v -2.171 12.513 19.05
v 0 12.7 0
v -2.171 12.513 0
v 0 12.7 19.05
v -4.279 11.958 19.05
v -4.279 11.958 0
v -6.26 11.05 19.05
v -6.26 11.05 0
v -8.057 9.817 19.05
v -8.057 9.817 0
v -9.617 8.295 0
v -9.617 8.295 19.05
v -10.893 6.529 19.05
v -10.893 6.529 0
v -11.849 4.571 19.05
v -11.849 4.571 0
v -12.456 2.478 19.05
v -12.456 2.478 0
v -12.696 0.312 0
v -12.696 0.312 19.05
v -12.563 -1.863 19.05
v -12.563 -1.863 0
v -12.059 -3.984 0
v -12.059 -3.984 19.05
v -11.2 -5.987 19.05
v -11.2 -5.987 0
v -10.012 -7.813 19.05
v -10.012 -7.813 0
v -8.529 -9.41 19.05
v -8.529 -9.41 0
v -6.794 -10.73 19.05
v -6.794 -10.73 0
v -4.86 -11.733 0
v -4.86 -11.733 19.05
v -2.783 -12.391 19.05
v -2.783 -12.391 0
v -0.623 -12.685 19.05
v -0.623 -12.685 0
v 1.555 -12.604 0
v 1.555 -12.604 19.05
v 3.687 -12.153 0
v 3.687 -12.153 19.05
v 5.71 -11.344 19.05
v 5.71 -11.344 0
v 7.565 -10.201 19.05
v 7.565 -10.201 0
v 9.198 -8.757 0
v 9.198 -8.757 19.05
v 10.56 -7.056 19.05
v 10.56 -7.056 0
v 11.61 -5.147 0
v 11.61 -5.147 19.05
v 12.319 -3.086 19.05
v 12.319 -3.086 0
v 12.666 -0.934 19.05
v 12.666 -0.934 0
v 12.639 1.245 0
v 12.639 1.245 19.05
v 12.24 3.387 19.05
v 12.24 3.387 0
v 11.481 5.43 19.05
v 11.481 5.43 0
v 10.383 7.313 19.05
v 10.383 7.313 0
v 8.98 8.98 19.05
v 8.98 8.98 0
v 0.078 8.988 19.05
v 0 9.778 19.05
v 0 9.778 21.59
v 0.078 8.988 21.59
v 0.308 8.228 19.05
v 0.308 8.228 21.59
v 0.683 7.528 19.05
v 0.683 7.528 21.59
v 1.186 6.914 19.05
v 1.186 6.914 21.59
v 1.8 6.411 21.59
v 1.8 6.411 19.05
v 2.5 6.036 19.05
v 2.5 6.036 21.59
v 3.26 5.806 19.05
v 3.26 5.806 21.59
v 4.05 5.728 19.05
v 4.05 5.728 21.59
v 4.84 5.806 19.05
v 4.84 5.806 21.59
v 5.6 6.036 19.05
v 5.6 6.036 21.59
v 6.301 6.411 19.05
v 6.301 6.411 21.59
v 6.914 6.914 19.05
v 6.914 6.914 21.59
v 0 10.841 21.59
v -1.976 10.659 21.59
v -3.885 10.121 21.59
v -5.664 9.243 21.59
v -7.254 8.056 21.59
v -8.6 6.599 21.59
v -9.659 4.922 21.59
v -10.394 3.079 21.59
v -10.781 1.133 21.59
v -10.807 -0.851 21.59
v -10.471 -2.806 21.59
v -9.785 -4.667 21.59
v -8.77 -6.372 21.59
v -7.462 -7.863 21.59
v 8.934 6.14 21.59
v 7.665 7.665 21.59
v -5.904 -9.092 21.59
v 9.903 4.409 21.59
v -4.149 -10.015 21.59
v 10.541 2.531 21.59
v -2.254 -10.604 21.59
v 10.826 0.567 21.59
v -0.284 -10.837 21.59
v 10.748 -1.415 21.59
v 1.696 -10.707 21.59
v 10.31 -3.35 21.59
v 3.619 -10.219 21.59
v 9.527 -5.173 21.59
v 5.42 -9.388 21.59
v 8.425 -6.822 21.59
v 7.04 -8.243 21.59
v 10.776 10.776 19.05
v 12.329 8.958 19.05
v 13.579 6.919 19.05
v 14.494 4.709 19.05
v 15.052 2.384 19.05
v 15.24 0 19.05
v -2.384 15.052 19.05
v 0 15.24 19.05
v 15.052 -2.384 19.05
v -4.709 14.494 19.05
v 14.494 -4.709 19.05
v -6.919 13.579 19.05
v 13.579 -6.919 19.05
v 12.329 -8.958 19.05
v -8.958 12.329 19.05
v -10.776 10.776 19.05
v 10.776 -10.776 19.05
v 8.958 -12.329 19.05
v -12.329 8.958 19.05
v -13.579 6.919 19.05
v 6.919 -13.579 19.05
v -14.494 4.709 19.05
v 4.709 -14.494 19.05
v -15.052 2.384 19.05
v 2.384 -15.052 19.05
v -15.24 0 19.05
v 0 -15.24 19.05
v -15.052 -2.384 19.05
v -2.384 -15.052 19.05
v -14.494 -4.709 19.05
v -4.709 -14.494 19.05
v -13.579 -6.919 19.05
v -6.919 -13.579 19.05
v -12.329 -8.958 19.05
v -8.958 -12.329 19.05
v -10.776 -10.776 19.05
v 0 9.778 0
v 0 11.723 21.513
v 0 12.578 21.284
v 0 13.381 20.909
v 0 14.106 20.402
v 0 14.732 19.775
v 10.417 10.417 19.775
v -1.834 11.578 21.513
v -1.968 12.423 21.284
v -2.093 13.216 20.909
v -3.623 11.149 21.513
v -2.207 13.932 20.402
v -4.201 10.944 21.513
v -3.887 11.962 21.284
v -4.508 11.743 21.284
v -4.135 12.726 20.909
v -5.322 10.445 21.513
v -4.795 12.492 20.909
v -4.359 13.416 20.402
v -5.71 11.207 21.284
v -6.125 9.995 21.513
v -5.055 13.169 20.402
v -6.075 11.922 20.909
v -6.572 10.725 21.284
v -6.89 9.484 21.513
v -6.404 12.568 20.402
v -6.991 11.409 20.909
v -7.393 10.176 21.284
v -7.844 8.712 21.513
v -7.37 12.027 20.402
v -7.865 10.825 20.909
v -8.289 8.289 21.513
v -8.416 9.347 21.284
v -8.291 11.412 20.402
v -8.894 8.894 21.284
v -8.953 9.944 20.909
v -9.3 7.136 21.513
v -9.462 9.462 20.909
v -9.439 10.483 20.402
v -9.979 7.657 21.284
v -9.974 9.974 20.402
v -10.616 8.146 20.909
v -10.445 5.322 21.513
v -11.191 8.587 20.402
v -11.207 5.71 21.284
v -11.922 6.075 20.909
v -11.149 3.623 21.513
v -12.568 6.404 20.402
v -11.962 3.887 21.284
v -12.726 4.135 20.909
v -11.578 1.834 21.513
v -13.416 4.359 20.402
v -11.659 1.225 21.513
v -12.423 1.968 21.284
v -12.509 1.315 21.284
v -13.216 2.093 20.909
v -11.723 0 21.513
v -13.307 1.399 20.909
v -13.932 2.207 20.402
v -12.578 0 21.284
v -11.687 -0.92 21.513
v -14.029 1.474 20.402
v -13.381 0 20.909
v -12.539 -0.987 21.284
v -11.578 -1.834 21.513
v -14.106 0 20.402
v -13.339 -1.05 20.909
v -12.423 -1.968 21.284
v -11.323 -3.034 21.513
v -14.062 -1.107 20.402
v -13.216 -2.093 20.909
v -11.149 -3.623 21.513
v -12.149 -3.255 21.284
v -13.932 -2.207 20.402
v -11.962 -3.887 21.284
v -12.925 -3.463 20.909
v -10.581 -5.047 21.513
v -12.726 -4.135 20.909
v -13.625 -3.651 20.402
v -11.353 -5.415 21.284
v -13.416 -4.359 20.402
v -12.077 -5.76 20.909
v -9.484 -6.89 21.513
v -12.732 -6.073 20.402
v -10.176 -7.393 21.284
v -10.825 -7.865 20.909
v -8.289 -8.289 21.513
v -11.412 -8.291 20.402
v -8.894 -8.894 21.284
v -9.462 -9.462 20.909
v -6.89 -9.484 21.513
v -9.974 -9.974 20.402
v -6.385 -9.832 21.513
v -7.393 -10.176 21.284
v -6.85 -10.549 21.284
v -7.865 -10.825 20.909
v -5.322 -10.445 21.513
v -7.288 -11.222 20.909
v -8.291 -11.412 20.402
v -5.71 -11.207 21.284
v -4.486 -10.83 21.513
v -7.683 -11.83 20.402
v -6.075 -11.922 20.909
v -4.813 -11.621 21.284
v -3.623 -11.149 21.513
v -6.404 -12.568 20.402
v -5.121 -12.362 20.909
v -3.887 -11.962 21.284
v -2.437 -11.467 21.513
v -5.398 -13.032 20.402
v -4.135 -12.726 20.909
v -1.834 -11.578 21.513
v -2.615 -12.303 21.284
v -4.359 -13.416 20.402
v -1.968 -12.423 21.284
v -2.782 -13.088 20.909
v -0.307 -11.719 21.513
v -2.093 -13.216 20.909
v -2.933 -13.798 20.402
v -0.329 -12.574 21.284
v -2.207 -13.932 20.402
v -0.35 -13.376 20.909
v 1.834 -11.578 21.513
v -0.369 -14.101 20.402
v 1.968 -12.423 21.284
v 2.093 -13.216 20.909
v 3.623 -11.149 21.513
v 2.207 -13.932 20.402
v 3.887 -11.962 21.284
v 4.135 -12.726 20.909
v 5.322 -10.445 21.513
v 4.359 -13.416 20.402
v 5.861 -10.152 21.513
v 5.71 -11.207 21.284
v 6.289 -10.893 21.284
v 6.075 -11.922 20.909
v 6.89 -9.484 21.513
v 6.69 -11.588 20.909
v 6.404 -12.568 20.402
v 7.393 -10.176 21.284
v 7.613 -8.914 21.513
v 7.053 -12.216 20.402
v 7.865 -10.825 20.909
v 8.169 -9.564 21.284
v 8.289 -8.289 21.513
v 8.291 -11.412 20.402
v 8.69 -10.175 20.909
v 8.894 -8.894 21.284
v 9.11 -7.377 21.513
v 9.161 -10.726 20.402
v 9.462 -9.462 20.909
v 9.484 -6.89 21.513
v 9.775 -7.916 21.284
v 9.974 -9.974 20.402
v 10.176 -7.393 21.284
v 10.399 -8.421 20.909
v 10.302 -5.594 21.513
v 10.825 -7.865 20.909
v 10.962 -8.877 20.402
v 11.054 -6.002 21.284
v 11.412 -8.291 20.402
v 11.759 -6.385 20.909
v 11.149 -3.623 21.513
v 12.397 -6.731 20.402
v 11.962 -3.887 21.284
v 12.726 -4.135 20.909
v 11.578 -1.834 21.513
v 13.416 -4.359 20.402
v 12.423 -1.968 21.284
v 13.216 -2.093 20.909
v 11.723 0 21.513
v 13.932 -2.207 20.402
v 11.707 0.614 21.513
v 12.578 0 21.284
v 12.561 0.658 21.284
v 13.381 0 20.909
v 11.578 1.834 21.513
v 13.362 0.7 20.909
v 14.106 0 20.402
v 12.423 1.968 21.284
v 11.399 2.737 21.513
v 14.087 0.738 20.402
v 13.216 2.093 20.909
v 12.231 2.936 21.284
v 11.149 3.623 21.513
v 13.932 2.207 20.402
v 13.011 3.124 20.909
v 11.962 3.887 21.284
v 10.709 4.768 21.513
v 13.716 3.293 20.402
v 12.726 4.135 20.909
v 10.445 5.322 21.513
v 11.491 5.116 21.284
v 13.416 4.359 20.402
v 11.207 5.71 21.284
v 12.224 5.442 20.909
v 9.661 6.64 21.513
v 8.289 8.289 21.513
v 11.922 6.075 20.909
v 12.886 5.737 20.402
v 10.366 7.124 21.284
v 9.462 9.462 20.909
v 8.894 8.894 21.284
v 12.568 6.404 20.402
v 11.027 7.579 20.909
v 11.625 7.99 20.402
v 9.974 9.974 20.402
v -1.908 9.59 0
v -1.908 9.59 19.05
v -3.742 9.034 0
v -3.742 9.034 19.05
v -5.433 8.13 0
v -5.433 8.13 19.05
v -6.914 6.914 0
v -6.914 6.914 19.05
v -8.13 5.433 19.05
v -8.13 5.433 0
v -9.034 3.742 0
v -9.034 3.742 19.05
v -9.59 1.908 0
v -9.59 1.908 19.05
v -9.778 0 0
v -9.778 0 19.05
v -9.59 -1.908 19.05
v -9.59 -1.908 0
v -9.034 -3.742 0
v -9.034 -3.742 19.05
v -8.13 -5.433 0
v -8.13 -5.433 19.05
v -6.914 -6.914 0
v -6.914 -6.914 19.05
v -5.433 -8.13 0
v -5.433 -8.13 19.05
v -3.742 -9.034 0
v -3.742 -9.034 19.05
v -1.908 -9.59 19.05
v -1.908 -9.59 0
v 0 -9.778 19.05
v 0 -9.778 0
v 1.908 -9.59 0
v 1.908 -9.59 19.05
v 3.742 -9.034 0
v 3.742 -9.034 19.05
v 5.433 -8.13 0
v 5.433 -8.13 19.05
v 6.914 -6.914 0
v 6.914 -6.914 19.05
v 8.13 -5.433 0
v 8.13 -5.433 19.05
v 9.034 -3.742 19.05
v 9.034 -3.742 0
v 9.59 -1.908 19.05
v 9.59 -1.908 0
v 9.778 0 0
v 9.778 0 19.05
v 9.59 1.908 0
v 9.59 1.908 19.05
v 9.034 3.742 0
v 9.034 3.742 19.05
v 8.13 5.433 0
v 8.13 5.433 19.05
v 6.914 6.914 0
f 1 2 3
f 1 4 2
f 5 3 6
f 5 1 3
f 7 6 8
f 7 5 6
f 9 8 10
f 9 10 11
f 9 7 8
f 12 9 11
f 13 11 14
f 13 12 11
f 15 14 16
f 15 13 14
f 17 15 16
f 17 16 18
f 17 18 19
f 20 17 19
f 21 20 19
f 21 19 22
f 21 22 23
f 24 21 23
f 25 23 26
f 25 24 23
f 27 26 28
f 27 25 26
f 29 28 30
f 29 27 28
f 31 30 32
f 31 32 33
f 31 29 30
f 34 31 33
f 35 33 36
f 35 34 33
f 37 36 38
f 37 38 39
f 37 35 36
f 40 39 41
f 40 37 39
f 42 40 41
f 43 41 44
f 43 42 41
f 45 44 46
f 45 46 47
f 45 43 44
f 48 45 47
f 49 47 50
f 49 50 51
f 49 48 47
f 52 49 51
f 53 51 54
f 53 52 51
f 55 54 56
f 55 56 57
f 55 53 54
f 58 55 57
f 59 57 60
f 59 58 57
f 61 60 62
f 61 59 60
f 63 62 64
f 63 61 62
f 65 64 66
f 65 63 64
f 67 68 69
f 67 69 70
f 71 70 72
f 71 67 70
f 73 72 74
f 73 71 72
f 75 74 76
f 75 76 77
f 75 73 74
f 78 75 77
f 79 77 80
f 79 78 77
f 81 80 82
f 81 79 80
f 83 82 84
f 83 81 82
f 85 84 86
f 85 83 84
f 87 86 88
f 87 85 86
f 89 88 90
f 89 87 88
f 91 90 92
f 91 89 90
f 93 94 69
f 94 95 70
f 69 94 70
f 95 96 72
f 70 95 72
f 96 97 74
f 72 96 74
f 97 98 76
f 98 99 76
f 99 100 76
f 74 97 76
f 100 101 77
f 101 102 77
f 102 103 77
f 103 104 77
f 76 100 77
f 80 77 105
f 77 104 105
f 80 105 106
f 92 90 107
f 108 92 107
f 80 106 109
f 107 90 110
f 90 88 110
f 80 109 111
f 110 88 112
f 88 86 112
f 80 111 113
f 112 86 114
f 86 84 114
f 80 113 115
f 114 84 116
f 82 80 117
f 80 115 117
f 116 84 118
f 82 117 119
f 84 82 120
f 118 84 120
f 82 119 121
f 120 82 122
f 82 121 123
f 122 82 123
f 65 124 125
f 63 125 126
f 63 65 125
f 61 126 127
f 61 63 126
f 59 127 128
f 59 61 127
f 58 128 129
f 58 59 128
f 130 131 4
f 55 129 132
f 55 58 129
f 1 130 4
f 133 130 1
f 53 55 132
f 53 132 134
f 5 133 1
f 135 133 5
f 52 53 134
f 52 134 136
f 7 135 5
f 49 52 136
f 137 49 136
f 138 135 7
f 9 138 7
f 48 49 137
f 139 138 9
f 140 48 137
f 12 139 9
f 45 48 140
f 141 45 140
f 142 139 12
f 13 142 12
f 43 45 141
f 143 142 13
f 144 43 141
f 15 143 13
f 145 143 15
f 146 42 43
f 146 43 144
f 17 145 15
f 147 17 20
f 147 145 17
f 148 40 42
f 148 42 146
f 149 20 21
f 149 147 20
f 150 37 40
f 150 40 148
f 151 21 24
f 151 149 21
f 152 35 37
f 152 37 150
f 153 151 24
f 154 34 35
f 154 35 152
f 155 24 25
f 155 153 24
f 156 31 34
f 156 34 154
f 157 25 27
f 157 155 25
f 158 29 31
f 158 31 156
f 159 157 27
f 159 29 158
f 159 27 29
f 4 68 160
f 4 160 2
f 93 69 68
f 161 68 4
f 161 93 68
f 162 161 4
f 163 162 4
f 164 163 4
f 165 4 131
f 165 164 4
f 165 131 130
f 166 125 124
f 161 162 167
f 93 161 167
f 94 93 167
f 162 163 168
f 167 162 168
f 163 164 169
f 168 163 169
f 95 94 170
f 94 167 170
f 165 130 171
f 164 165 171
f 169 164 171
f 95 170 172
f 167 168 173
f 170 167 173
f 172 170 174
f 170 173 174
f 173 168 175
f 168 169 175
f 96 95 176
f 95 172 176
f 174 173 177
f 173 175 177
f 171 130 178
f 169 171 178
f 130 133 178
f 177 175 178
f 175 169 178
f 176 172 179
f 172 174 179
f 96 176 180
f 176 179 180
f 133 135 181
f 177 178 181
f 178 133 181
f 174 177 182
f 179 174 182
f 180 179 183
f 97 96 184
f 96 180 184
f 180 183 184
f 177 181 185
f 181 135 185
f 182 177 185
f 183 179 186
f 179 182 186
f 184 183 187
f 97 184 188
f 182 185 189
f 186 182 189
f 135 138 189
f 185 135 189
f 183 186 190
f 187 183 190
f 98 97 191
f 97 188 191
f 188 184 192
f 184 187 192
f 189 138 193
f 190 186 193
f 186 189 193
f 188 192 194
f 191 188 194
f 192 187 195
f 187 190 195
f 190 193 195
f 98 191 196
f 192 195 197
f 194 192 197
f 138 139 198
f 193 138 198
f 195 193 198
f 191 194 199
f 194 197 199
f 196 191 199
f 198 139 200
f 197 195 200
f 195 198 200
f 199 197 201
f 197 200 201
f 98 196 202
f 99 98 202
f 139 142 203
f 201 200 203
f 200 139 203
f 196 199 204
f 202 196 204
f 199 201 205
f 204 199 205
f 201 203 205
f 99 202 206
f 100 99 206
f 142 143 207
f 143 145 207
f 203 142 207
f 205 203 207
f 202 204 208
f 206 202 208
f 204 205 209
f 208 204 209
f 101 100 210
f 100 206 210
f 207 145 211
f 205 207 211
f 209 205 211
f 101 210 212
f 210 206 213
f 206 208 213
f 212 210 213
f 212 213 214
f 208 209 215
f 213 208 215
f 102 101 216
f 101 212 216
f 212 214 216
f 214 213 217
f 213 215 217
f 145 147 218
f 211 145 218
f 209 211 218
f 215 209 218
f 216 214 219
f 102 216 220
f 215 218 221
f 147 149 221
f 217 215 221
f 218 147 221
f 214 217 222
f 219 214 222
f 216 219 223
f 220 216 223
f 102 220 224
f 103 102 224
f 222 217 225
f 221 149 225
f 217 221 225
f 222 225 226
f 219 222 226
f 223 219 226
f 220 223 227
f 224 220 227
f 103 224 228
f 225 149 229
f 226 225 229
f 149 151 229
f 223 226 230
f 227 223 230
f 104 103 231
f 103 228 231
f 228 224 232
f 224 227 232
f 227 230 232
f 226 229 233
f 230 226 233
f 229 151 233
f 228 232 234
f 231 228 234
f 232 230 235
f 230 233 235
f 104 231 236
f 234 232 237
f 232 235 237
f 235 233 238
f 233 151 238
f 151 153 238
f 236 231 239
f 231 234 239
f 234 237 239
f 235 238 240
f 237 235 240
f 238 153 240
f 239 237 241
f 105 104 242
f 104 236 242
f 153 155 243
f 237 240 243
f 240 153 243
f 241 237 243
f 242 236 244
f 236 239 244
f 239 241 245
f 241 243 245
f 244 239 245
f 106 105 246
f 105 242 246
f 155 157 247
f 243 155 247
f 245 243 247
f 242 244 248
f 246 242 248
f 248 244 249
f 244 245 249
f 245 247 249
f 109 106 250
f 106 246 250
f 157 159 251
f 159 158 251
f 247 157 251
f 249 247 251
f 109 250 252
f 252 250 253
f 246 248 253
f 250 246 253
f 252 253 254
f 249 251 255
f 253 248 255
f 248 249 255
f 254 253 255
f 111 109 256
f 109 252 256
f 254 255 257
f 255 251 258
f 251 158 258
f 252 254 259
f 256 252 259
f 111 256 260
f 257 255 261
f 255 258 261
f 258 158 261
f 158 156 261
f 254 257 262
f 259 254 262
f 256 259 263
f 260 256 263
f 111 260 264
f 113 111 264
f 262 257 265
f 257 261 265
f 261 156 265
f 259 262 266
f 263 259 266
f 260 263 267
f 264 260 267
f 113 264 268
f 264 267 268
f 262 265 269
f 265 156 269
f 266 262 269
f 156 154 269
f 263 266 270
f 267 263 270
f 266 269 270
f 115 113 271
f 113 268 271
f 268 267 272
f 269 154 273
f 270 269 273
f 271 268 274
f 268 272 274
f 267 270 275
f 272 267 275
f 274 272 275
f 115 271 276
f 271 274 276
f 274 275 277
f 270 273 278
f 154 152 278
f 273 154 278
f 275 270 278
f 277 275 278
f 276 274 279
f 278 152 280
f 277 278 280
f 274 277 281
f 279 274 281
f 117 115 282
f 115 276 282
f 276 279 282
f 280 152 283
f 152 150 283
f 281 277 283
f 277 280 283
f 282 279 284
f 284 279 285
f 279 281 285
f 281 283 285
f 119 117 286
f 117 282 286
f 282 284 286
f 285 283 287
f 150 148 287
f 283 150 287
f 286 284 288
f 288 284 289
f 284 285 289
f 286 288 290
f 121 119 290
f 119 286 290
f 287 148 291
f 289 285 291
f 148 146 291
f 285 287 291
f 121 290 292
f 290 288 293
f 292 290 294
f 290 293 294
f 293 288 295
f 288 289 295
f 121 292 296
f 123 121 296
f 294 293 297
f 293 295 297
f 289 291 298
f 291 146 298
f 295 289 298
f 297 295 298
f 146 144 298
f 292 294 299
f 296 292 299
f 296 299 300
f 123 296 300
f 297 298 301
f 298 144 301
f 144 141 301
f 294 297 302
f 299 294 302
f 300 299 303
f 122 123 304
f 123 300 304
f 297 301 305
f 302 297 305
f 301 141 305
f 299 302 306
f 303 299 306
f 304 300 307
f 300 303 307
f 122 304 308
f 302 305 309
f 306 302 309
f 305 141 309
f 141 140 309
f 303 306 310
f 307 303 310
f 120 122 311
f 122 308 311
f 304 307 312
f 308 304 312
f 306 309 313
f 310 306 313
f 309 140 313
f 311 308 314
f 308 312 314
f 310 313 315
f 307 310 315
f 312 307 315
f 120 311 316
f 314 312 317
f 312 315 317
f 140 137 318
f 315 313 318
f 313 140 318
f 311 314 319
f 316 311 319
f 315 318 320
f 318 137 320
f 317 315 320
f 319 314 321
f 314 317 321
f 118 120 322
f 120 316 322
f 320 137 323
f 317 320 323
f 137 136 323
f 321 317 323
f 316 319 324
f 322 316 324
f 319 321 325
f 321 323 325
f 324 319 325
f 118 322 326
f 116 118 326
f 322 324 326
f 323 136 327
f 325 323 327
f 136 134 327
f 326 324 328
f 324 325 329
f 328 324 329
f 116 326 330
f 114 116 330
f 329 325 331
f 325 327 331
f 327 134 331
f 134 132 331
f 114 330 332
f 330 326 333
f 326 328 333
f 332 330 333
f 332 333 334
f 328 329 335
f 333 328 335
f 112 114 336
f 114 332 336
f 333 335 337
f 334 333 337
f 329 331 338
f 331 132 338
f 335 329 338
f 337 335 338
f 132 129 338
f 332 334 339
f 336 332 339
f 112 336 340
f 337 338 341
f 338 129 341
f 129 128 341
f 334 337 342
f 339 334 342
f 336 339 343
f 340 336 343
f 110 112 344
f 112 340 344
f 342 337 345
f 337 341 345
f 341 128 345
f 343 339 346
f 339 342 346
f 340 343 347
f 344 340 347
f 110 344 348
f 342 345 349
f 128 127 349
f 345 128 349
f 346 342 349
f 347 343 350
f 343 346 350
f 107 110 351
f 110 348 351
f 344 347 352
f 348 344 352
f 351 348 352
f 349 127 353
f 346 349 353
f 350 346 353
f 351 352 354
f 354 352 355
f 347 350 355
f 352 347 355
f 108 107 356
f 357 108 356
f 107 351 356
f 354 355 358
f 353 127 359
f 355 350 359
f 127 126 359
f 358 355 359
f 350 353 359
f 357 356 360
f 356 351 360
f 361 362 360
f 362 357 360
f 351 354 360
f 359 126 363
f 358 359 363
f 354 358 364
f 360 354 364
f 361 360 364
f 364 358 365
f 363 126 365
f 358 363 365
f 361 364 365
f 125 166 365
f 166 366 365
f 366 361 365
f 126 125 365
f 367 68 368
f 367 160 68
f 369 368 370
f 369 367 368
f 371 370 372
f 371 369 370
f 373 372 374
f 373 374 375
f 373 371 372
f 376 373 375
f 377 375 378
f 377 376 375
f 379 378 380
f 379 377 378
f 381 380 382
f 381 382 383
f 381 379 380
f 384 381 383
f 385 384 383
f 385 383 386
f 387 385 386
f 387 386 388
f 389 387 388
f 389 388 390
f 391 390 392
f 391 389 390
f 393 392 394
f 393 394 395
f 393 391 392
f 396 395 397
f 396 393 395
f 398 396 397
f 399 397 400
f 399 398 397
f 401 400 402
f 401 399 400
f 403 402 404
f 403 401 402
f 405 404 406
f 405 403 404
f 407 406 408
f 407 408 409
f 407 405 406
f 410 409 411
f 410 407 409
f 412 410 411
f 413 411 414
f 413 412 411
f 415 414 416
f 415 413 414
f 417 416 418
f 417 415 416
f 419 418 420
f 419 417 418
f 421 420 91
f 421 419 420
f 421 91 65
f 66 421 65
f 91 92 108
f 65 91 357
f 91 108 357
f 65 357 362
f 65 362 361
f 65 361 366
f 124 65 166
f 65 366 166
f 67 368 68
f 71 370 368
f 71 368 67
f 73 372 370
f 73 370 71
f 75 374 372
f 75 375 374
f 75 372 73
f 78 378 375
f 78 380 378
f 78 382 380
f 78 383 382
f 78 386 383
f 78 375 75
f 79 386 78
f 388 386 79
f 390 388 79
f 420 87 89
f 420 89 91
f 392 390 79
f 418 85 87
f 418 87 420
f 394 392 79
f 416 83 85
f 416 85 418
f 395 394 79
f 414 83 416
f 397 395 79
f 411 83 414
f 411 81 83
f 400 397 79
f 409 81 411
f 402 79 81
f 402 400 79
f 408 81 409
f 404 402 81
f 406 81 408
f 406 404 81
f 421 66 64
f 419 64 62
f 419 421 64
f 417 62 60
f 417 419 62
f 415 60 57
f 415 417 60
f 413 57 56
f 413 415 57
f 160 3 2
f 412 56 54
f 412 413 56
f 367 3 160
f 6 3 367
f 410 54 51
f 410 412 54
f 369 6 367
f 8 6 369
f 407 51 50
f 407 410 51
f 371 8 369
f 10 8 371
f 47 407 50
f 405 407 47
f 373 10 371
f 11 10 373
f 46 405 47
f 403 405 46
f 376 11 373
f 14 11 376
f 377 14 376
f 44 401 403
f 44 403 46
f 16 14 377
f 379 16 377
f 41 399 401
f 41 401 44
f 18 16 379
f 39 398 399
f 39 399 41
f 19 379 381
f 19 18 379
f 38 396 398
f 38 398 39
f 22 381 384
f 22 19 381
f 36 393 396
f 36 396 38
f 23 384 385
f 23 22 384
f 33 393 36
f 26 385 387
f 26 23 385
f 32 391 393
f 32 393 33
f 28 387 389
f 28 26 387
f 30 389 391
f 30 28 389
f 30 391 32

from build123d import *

# Parameters (mm, degrees)
F1_ANGLE    = 315
F2_T2_ANGLE = 359.64
F4_DEPTH    = 2.54


# Not quite as in the source:
# - a fillet or chamfer that OpenCascade refuses, or shapes differently, is made with other operations: its cross-section is extruded or revolved along the edge and cut away or added


with BuildPart() as f1:
    # F0 (on Right) → F1 (revolve)
    with BuildSketch(Plane.YZ):
        Polygon((15.24, 21.59), (0, 21.59), (0, 19.05), (9.7782645518, 19.05), (9.7782645518, 0), (12.7, 0), (12.7, 19.05), (15.24, 19.05), align=None)
    revolve(axis=Axis((0, 0, 20.32), (0, 0, 1)), revolution_arc=F1_ANGLE)

    # F2: fillet of radius 5.08 on 1 edges, made by hand

    # F2_s1 → F2_t2 (revolve, cut)
    with BuildSketch(Plane(origin=(0, 0, 0), x_dir=(0, 0, 1), z_dir=(0.9250772068, -0.3797790955, 0))):
        with BuildLine():
            ThreePointArc((21.59, -10.8405909488), (20.9094090512, -13.3805909488), (19.05, -15.24))
            Line((19.05, -15.24), (21.59, -15.24))
            Line((21.59, -15.24), (21.59, -10.8405909488))
        make_face()
    revolve(axis=Axis((0, 0, 21.59), (0, 0, 1)), revolution_arc=F2_T2_ANGLE, mode=Mode.SUBTRACT)

    # F3 (on face) → F4 (join)
    with BuildSketch(Plane(origin=(0, 0, 19.05), x_dir=(1, 0, 0), z_dir=(0, 0, -1))):
        with BuildLine():
            ThreePointArc((0, -9.7782645518), (2.5003109935, -6.0362847106), (6.9142771728, -6.9142771728))
            Line((6.9142771728, -6.9142771728), (0, 0))
            Line((0, 0), (0, -9.7782645518))
        make_face()
    extrude(amount=-F4_DEPTH)


solid = f1.part
